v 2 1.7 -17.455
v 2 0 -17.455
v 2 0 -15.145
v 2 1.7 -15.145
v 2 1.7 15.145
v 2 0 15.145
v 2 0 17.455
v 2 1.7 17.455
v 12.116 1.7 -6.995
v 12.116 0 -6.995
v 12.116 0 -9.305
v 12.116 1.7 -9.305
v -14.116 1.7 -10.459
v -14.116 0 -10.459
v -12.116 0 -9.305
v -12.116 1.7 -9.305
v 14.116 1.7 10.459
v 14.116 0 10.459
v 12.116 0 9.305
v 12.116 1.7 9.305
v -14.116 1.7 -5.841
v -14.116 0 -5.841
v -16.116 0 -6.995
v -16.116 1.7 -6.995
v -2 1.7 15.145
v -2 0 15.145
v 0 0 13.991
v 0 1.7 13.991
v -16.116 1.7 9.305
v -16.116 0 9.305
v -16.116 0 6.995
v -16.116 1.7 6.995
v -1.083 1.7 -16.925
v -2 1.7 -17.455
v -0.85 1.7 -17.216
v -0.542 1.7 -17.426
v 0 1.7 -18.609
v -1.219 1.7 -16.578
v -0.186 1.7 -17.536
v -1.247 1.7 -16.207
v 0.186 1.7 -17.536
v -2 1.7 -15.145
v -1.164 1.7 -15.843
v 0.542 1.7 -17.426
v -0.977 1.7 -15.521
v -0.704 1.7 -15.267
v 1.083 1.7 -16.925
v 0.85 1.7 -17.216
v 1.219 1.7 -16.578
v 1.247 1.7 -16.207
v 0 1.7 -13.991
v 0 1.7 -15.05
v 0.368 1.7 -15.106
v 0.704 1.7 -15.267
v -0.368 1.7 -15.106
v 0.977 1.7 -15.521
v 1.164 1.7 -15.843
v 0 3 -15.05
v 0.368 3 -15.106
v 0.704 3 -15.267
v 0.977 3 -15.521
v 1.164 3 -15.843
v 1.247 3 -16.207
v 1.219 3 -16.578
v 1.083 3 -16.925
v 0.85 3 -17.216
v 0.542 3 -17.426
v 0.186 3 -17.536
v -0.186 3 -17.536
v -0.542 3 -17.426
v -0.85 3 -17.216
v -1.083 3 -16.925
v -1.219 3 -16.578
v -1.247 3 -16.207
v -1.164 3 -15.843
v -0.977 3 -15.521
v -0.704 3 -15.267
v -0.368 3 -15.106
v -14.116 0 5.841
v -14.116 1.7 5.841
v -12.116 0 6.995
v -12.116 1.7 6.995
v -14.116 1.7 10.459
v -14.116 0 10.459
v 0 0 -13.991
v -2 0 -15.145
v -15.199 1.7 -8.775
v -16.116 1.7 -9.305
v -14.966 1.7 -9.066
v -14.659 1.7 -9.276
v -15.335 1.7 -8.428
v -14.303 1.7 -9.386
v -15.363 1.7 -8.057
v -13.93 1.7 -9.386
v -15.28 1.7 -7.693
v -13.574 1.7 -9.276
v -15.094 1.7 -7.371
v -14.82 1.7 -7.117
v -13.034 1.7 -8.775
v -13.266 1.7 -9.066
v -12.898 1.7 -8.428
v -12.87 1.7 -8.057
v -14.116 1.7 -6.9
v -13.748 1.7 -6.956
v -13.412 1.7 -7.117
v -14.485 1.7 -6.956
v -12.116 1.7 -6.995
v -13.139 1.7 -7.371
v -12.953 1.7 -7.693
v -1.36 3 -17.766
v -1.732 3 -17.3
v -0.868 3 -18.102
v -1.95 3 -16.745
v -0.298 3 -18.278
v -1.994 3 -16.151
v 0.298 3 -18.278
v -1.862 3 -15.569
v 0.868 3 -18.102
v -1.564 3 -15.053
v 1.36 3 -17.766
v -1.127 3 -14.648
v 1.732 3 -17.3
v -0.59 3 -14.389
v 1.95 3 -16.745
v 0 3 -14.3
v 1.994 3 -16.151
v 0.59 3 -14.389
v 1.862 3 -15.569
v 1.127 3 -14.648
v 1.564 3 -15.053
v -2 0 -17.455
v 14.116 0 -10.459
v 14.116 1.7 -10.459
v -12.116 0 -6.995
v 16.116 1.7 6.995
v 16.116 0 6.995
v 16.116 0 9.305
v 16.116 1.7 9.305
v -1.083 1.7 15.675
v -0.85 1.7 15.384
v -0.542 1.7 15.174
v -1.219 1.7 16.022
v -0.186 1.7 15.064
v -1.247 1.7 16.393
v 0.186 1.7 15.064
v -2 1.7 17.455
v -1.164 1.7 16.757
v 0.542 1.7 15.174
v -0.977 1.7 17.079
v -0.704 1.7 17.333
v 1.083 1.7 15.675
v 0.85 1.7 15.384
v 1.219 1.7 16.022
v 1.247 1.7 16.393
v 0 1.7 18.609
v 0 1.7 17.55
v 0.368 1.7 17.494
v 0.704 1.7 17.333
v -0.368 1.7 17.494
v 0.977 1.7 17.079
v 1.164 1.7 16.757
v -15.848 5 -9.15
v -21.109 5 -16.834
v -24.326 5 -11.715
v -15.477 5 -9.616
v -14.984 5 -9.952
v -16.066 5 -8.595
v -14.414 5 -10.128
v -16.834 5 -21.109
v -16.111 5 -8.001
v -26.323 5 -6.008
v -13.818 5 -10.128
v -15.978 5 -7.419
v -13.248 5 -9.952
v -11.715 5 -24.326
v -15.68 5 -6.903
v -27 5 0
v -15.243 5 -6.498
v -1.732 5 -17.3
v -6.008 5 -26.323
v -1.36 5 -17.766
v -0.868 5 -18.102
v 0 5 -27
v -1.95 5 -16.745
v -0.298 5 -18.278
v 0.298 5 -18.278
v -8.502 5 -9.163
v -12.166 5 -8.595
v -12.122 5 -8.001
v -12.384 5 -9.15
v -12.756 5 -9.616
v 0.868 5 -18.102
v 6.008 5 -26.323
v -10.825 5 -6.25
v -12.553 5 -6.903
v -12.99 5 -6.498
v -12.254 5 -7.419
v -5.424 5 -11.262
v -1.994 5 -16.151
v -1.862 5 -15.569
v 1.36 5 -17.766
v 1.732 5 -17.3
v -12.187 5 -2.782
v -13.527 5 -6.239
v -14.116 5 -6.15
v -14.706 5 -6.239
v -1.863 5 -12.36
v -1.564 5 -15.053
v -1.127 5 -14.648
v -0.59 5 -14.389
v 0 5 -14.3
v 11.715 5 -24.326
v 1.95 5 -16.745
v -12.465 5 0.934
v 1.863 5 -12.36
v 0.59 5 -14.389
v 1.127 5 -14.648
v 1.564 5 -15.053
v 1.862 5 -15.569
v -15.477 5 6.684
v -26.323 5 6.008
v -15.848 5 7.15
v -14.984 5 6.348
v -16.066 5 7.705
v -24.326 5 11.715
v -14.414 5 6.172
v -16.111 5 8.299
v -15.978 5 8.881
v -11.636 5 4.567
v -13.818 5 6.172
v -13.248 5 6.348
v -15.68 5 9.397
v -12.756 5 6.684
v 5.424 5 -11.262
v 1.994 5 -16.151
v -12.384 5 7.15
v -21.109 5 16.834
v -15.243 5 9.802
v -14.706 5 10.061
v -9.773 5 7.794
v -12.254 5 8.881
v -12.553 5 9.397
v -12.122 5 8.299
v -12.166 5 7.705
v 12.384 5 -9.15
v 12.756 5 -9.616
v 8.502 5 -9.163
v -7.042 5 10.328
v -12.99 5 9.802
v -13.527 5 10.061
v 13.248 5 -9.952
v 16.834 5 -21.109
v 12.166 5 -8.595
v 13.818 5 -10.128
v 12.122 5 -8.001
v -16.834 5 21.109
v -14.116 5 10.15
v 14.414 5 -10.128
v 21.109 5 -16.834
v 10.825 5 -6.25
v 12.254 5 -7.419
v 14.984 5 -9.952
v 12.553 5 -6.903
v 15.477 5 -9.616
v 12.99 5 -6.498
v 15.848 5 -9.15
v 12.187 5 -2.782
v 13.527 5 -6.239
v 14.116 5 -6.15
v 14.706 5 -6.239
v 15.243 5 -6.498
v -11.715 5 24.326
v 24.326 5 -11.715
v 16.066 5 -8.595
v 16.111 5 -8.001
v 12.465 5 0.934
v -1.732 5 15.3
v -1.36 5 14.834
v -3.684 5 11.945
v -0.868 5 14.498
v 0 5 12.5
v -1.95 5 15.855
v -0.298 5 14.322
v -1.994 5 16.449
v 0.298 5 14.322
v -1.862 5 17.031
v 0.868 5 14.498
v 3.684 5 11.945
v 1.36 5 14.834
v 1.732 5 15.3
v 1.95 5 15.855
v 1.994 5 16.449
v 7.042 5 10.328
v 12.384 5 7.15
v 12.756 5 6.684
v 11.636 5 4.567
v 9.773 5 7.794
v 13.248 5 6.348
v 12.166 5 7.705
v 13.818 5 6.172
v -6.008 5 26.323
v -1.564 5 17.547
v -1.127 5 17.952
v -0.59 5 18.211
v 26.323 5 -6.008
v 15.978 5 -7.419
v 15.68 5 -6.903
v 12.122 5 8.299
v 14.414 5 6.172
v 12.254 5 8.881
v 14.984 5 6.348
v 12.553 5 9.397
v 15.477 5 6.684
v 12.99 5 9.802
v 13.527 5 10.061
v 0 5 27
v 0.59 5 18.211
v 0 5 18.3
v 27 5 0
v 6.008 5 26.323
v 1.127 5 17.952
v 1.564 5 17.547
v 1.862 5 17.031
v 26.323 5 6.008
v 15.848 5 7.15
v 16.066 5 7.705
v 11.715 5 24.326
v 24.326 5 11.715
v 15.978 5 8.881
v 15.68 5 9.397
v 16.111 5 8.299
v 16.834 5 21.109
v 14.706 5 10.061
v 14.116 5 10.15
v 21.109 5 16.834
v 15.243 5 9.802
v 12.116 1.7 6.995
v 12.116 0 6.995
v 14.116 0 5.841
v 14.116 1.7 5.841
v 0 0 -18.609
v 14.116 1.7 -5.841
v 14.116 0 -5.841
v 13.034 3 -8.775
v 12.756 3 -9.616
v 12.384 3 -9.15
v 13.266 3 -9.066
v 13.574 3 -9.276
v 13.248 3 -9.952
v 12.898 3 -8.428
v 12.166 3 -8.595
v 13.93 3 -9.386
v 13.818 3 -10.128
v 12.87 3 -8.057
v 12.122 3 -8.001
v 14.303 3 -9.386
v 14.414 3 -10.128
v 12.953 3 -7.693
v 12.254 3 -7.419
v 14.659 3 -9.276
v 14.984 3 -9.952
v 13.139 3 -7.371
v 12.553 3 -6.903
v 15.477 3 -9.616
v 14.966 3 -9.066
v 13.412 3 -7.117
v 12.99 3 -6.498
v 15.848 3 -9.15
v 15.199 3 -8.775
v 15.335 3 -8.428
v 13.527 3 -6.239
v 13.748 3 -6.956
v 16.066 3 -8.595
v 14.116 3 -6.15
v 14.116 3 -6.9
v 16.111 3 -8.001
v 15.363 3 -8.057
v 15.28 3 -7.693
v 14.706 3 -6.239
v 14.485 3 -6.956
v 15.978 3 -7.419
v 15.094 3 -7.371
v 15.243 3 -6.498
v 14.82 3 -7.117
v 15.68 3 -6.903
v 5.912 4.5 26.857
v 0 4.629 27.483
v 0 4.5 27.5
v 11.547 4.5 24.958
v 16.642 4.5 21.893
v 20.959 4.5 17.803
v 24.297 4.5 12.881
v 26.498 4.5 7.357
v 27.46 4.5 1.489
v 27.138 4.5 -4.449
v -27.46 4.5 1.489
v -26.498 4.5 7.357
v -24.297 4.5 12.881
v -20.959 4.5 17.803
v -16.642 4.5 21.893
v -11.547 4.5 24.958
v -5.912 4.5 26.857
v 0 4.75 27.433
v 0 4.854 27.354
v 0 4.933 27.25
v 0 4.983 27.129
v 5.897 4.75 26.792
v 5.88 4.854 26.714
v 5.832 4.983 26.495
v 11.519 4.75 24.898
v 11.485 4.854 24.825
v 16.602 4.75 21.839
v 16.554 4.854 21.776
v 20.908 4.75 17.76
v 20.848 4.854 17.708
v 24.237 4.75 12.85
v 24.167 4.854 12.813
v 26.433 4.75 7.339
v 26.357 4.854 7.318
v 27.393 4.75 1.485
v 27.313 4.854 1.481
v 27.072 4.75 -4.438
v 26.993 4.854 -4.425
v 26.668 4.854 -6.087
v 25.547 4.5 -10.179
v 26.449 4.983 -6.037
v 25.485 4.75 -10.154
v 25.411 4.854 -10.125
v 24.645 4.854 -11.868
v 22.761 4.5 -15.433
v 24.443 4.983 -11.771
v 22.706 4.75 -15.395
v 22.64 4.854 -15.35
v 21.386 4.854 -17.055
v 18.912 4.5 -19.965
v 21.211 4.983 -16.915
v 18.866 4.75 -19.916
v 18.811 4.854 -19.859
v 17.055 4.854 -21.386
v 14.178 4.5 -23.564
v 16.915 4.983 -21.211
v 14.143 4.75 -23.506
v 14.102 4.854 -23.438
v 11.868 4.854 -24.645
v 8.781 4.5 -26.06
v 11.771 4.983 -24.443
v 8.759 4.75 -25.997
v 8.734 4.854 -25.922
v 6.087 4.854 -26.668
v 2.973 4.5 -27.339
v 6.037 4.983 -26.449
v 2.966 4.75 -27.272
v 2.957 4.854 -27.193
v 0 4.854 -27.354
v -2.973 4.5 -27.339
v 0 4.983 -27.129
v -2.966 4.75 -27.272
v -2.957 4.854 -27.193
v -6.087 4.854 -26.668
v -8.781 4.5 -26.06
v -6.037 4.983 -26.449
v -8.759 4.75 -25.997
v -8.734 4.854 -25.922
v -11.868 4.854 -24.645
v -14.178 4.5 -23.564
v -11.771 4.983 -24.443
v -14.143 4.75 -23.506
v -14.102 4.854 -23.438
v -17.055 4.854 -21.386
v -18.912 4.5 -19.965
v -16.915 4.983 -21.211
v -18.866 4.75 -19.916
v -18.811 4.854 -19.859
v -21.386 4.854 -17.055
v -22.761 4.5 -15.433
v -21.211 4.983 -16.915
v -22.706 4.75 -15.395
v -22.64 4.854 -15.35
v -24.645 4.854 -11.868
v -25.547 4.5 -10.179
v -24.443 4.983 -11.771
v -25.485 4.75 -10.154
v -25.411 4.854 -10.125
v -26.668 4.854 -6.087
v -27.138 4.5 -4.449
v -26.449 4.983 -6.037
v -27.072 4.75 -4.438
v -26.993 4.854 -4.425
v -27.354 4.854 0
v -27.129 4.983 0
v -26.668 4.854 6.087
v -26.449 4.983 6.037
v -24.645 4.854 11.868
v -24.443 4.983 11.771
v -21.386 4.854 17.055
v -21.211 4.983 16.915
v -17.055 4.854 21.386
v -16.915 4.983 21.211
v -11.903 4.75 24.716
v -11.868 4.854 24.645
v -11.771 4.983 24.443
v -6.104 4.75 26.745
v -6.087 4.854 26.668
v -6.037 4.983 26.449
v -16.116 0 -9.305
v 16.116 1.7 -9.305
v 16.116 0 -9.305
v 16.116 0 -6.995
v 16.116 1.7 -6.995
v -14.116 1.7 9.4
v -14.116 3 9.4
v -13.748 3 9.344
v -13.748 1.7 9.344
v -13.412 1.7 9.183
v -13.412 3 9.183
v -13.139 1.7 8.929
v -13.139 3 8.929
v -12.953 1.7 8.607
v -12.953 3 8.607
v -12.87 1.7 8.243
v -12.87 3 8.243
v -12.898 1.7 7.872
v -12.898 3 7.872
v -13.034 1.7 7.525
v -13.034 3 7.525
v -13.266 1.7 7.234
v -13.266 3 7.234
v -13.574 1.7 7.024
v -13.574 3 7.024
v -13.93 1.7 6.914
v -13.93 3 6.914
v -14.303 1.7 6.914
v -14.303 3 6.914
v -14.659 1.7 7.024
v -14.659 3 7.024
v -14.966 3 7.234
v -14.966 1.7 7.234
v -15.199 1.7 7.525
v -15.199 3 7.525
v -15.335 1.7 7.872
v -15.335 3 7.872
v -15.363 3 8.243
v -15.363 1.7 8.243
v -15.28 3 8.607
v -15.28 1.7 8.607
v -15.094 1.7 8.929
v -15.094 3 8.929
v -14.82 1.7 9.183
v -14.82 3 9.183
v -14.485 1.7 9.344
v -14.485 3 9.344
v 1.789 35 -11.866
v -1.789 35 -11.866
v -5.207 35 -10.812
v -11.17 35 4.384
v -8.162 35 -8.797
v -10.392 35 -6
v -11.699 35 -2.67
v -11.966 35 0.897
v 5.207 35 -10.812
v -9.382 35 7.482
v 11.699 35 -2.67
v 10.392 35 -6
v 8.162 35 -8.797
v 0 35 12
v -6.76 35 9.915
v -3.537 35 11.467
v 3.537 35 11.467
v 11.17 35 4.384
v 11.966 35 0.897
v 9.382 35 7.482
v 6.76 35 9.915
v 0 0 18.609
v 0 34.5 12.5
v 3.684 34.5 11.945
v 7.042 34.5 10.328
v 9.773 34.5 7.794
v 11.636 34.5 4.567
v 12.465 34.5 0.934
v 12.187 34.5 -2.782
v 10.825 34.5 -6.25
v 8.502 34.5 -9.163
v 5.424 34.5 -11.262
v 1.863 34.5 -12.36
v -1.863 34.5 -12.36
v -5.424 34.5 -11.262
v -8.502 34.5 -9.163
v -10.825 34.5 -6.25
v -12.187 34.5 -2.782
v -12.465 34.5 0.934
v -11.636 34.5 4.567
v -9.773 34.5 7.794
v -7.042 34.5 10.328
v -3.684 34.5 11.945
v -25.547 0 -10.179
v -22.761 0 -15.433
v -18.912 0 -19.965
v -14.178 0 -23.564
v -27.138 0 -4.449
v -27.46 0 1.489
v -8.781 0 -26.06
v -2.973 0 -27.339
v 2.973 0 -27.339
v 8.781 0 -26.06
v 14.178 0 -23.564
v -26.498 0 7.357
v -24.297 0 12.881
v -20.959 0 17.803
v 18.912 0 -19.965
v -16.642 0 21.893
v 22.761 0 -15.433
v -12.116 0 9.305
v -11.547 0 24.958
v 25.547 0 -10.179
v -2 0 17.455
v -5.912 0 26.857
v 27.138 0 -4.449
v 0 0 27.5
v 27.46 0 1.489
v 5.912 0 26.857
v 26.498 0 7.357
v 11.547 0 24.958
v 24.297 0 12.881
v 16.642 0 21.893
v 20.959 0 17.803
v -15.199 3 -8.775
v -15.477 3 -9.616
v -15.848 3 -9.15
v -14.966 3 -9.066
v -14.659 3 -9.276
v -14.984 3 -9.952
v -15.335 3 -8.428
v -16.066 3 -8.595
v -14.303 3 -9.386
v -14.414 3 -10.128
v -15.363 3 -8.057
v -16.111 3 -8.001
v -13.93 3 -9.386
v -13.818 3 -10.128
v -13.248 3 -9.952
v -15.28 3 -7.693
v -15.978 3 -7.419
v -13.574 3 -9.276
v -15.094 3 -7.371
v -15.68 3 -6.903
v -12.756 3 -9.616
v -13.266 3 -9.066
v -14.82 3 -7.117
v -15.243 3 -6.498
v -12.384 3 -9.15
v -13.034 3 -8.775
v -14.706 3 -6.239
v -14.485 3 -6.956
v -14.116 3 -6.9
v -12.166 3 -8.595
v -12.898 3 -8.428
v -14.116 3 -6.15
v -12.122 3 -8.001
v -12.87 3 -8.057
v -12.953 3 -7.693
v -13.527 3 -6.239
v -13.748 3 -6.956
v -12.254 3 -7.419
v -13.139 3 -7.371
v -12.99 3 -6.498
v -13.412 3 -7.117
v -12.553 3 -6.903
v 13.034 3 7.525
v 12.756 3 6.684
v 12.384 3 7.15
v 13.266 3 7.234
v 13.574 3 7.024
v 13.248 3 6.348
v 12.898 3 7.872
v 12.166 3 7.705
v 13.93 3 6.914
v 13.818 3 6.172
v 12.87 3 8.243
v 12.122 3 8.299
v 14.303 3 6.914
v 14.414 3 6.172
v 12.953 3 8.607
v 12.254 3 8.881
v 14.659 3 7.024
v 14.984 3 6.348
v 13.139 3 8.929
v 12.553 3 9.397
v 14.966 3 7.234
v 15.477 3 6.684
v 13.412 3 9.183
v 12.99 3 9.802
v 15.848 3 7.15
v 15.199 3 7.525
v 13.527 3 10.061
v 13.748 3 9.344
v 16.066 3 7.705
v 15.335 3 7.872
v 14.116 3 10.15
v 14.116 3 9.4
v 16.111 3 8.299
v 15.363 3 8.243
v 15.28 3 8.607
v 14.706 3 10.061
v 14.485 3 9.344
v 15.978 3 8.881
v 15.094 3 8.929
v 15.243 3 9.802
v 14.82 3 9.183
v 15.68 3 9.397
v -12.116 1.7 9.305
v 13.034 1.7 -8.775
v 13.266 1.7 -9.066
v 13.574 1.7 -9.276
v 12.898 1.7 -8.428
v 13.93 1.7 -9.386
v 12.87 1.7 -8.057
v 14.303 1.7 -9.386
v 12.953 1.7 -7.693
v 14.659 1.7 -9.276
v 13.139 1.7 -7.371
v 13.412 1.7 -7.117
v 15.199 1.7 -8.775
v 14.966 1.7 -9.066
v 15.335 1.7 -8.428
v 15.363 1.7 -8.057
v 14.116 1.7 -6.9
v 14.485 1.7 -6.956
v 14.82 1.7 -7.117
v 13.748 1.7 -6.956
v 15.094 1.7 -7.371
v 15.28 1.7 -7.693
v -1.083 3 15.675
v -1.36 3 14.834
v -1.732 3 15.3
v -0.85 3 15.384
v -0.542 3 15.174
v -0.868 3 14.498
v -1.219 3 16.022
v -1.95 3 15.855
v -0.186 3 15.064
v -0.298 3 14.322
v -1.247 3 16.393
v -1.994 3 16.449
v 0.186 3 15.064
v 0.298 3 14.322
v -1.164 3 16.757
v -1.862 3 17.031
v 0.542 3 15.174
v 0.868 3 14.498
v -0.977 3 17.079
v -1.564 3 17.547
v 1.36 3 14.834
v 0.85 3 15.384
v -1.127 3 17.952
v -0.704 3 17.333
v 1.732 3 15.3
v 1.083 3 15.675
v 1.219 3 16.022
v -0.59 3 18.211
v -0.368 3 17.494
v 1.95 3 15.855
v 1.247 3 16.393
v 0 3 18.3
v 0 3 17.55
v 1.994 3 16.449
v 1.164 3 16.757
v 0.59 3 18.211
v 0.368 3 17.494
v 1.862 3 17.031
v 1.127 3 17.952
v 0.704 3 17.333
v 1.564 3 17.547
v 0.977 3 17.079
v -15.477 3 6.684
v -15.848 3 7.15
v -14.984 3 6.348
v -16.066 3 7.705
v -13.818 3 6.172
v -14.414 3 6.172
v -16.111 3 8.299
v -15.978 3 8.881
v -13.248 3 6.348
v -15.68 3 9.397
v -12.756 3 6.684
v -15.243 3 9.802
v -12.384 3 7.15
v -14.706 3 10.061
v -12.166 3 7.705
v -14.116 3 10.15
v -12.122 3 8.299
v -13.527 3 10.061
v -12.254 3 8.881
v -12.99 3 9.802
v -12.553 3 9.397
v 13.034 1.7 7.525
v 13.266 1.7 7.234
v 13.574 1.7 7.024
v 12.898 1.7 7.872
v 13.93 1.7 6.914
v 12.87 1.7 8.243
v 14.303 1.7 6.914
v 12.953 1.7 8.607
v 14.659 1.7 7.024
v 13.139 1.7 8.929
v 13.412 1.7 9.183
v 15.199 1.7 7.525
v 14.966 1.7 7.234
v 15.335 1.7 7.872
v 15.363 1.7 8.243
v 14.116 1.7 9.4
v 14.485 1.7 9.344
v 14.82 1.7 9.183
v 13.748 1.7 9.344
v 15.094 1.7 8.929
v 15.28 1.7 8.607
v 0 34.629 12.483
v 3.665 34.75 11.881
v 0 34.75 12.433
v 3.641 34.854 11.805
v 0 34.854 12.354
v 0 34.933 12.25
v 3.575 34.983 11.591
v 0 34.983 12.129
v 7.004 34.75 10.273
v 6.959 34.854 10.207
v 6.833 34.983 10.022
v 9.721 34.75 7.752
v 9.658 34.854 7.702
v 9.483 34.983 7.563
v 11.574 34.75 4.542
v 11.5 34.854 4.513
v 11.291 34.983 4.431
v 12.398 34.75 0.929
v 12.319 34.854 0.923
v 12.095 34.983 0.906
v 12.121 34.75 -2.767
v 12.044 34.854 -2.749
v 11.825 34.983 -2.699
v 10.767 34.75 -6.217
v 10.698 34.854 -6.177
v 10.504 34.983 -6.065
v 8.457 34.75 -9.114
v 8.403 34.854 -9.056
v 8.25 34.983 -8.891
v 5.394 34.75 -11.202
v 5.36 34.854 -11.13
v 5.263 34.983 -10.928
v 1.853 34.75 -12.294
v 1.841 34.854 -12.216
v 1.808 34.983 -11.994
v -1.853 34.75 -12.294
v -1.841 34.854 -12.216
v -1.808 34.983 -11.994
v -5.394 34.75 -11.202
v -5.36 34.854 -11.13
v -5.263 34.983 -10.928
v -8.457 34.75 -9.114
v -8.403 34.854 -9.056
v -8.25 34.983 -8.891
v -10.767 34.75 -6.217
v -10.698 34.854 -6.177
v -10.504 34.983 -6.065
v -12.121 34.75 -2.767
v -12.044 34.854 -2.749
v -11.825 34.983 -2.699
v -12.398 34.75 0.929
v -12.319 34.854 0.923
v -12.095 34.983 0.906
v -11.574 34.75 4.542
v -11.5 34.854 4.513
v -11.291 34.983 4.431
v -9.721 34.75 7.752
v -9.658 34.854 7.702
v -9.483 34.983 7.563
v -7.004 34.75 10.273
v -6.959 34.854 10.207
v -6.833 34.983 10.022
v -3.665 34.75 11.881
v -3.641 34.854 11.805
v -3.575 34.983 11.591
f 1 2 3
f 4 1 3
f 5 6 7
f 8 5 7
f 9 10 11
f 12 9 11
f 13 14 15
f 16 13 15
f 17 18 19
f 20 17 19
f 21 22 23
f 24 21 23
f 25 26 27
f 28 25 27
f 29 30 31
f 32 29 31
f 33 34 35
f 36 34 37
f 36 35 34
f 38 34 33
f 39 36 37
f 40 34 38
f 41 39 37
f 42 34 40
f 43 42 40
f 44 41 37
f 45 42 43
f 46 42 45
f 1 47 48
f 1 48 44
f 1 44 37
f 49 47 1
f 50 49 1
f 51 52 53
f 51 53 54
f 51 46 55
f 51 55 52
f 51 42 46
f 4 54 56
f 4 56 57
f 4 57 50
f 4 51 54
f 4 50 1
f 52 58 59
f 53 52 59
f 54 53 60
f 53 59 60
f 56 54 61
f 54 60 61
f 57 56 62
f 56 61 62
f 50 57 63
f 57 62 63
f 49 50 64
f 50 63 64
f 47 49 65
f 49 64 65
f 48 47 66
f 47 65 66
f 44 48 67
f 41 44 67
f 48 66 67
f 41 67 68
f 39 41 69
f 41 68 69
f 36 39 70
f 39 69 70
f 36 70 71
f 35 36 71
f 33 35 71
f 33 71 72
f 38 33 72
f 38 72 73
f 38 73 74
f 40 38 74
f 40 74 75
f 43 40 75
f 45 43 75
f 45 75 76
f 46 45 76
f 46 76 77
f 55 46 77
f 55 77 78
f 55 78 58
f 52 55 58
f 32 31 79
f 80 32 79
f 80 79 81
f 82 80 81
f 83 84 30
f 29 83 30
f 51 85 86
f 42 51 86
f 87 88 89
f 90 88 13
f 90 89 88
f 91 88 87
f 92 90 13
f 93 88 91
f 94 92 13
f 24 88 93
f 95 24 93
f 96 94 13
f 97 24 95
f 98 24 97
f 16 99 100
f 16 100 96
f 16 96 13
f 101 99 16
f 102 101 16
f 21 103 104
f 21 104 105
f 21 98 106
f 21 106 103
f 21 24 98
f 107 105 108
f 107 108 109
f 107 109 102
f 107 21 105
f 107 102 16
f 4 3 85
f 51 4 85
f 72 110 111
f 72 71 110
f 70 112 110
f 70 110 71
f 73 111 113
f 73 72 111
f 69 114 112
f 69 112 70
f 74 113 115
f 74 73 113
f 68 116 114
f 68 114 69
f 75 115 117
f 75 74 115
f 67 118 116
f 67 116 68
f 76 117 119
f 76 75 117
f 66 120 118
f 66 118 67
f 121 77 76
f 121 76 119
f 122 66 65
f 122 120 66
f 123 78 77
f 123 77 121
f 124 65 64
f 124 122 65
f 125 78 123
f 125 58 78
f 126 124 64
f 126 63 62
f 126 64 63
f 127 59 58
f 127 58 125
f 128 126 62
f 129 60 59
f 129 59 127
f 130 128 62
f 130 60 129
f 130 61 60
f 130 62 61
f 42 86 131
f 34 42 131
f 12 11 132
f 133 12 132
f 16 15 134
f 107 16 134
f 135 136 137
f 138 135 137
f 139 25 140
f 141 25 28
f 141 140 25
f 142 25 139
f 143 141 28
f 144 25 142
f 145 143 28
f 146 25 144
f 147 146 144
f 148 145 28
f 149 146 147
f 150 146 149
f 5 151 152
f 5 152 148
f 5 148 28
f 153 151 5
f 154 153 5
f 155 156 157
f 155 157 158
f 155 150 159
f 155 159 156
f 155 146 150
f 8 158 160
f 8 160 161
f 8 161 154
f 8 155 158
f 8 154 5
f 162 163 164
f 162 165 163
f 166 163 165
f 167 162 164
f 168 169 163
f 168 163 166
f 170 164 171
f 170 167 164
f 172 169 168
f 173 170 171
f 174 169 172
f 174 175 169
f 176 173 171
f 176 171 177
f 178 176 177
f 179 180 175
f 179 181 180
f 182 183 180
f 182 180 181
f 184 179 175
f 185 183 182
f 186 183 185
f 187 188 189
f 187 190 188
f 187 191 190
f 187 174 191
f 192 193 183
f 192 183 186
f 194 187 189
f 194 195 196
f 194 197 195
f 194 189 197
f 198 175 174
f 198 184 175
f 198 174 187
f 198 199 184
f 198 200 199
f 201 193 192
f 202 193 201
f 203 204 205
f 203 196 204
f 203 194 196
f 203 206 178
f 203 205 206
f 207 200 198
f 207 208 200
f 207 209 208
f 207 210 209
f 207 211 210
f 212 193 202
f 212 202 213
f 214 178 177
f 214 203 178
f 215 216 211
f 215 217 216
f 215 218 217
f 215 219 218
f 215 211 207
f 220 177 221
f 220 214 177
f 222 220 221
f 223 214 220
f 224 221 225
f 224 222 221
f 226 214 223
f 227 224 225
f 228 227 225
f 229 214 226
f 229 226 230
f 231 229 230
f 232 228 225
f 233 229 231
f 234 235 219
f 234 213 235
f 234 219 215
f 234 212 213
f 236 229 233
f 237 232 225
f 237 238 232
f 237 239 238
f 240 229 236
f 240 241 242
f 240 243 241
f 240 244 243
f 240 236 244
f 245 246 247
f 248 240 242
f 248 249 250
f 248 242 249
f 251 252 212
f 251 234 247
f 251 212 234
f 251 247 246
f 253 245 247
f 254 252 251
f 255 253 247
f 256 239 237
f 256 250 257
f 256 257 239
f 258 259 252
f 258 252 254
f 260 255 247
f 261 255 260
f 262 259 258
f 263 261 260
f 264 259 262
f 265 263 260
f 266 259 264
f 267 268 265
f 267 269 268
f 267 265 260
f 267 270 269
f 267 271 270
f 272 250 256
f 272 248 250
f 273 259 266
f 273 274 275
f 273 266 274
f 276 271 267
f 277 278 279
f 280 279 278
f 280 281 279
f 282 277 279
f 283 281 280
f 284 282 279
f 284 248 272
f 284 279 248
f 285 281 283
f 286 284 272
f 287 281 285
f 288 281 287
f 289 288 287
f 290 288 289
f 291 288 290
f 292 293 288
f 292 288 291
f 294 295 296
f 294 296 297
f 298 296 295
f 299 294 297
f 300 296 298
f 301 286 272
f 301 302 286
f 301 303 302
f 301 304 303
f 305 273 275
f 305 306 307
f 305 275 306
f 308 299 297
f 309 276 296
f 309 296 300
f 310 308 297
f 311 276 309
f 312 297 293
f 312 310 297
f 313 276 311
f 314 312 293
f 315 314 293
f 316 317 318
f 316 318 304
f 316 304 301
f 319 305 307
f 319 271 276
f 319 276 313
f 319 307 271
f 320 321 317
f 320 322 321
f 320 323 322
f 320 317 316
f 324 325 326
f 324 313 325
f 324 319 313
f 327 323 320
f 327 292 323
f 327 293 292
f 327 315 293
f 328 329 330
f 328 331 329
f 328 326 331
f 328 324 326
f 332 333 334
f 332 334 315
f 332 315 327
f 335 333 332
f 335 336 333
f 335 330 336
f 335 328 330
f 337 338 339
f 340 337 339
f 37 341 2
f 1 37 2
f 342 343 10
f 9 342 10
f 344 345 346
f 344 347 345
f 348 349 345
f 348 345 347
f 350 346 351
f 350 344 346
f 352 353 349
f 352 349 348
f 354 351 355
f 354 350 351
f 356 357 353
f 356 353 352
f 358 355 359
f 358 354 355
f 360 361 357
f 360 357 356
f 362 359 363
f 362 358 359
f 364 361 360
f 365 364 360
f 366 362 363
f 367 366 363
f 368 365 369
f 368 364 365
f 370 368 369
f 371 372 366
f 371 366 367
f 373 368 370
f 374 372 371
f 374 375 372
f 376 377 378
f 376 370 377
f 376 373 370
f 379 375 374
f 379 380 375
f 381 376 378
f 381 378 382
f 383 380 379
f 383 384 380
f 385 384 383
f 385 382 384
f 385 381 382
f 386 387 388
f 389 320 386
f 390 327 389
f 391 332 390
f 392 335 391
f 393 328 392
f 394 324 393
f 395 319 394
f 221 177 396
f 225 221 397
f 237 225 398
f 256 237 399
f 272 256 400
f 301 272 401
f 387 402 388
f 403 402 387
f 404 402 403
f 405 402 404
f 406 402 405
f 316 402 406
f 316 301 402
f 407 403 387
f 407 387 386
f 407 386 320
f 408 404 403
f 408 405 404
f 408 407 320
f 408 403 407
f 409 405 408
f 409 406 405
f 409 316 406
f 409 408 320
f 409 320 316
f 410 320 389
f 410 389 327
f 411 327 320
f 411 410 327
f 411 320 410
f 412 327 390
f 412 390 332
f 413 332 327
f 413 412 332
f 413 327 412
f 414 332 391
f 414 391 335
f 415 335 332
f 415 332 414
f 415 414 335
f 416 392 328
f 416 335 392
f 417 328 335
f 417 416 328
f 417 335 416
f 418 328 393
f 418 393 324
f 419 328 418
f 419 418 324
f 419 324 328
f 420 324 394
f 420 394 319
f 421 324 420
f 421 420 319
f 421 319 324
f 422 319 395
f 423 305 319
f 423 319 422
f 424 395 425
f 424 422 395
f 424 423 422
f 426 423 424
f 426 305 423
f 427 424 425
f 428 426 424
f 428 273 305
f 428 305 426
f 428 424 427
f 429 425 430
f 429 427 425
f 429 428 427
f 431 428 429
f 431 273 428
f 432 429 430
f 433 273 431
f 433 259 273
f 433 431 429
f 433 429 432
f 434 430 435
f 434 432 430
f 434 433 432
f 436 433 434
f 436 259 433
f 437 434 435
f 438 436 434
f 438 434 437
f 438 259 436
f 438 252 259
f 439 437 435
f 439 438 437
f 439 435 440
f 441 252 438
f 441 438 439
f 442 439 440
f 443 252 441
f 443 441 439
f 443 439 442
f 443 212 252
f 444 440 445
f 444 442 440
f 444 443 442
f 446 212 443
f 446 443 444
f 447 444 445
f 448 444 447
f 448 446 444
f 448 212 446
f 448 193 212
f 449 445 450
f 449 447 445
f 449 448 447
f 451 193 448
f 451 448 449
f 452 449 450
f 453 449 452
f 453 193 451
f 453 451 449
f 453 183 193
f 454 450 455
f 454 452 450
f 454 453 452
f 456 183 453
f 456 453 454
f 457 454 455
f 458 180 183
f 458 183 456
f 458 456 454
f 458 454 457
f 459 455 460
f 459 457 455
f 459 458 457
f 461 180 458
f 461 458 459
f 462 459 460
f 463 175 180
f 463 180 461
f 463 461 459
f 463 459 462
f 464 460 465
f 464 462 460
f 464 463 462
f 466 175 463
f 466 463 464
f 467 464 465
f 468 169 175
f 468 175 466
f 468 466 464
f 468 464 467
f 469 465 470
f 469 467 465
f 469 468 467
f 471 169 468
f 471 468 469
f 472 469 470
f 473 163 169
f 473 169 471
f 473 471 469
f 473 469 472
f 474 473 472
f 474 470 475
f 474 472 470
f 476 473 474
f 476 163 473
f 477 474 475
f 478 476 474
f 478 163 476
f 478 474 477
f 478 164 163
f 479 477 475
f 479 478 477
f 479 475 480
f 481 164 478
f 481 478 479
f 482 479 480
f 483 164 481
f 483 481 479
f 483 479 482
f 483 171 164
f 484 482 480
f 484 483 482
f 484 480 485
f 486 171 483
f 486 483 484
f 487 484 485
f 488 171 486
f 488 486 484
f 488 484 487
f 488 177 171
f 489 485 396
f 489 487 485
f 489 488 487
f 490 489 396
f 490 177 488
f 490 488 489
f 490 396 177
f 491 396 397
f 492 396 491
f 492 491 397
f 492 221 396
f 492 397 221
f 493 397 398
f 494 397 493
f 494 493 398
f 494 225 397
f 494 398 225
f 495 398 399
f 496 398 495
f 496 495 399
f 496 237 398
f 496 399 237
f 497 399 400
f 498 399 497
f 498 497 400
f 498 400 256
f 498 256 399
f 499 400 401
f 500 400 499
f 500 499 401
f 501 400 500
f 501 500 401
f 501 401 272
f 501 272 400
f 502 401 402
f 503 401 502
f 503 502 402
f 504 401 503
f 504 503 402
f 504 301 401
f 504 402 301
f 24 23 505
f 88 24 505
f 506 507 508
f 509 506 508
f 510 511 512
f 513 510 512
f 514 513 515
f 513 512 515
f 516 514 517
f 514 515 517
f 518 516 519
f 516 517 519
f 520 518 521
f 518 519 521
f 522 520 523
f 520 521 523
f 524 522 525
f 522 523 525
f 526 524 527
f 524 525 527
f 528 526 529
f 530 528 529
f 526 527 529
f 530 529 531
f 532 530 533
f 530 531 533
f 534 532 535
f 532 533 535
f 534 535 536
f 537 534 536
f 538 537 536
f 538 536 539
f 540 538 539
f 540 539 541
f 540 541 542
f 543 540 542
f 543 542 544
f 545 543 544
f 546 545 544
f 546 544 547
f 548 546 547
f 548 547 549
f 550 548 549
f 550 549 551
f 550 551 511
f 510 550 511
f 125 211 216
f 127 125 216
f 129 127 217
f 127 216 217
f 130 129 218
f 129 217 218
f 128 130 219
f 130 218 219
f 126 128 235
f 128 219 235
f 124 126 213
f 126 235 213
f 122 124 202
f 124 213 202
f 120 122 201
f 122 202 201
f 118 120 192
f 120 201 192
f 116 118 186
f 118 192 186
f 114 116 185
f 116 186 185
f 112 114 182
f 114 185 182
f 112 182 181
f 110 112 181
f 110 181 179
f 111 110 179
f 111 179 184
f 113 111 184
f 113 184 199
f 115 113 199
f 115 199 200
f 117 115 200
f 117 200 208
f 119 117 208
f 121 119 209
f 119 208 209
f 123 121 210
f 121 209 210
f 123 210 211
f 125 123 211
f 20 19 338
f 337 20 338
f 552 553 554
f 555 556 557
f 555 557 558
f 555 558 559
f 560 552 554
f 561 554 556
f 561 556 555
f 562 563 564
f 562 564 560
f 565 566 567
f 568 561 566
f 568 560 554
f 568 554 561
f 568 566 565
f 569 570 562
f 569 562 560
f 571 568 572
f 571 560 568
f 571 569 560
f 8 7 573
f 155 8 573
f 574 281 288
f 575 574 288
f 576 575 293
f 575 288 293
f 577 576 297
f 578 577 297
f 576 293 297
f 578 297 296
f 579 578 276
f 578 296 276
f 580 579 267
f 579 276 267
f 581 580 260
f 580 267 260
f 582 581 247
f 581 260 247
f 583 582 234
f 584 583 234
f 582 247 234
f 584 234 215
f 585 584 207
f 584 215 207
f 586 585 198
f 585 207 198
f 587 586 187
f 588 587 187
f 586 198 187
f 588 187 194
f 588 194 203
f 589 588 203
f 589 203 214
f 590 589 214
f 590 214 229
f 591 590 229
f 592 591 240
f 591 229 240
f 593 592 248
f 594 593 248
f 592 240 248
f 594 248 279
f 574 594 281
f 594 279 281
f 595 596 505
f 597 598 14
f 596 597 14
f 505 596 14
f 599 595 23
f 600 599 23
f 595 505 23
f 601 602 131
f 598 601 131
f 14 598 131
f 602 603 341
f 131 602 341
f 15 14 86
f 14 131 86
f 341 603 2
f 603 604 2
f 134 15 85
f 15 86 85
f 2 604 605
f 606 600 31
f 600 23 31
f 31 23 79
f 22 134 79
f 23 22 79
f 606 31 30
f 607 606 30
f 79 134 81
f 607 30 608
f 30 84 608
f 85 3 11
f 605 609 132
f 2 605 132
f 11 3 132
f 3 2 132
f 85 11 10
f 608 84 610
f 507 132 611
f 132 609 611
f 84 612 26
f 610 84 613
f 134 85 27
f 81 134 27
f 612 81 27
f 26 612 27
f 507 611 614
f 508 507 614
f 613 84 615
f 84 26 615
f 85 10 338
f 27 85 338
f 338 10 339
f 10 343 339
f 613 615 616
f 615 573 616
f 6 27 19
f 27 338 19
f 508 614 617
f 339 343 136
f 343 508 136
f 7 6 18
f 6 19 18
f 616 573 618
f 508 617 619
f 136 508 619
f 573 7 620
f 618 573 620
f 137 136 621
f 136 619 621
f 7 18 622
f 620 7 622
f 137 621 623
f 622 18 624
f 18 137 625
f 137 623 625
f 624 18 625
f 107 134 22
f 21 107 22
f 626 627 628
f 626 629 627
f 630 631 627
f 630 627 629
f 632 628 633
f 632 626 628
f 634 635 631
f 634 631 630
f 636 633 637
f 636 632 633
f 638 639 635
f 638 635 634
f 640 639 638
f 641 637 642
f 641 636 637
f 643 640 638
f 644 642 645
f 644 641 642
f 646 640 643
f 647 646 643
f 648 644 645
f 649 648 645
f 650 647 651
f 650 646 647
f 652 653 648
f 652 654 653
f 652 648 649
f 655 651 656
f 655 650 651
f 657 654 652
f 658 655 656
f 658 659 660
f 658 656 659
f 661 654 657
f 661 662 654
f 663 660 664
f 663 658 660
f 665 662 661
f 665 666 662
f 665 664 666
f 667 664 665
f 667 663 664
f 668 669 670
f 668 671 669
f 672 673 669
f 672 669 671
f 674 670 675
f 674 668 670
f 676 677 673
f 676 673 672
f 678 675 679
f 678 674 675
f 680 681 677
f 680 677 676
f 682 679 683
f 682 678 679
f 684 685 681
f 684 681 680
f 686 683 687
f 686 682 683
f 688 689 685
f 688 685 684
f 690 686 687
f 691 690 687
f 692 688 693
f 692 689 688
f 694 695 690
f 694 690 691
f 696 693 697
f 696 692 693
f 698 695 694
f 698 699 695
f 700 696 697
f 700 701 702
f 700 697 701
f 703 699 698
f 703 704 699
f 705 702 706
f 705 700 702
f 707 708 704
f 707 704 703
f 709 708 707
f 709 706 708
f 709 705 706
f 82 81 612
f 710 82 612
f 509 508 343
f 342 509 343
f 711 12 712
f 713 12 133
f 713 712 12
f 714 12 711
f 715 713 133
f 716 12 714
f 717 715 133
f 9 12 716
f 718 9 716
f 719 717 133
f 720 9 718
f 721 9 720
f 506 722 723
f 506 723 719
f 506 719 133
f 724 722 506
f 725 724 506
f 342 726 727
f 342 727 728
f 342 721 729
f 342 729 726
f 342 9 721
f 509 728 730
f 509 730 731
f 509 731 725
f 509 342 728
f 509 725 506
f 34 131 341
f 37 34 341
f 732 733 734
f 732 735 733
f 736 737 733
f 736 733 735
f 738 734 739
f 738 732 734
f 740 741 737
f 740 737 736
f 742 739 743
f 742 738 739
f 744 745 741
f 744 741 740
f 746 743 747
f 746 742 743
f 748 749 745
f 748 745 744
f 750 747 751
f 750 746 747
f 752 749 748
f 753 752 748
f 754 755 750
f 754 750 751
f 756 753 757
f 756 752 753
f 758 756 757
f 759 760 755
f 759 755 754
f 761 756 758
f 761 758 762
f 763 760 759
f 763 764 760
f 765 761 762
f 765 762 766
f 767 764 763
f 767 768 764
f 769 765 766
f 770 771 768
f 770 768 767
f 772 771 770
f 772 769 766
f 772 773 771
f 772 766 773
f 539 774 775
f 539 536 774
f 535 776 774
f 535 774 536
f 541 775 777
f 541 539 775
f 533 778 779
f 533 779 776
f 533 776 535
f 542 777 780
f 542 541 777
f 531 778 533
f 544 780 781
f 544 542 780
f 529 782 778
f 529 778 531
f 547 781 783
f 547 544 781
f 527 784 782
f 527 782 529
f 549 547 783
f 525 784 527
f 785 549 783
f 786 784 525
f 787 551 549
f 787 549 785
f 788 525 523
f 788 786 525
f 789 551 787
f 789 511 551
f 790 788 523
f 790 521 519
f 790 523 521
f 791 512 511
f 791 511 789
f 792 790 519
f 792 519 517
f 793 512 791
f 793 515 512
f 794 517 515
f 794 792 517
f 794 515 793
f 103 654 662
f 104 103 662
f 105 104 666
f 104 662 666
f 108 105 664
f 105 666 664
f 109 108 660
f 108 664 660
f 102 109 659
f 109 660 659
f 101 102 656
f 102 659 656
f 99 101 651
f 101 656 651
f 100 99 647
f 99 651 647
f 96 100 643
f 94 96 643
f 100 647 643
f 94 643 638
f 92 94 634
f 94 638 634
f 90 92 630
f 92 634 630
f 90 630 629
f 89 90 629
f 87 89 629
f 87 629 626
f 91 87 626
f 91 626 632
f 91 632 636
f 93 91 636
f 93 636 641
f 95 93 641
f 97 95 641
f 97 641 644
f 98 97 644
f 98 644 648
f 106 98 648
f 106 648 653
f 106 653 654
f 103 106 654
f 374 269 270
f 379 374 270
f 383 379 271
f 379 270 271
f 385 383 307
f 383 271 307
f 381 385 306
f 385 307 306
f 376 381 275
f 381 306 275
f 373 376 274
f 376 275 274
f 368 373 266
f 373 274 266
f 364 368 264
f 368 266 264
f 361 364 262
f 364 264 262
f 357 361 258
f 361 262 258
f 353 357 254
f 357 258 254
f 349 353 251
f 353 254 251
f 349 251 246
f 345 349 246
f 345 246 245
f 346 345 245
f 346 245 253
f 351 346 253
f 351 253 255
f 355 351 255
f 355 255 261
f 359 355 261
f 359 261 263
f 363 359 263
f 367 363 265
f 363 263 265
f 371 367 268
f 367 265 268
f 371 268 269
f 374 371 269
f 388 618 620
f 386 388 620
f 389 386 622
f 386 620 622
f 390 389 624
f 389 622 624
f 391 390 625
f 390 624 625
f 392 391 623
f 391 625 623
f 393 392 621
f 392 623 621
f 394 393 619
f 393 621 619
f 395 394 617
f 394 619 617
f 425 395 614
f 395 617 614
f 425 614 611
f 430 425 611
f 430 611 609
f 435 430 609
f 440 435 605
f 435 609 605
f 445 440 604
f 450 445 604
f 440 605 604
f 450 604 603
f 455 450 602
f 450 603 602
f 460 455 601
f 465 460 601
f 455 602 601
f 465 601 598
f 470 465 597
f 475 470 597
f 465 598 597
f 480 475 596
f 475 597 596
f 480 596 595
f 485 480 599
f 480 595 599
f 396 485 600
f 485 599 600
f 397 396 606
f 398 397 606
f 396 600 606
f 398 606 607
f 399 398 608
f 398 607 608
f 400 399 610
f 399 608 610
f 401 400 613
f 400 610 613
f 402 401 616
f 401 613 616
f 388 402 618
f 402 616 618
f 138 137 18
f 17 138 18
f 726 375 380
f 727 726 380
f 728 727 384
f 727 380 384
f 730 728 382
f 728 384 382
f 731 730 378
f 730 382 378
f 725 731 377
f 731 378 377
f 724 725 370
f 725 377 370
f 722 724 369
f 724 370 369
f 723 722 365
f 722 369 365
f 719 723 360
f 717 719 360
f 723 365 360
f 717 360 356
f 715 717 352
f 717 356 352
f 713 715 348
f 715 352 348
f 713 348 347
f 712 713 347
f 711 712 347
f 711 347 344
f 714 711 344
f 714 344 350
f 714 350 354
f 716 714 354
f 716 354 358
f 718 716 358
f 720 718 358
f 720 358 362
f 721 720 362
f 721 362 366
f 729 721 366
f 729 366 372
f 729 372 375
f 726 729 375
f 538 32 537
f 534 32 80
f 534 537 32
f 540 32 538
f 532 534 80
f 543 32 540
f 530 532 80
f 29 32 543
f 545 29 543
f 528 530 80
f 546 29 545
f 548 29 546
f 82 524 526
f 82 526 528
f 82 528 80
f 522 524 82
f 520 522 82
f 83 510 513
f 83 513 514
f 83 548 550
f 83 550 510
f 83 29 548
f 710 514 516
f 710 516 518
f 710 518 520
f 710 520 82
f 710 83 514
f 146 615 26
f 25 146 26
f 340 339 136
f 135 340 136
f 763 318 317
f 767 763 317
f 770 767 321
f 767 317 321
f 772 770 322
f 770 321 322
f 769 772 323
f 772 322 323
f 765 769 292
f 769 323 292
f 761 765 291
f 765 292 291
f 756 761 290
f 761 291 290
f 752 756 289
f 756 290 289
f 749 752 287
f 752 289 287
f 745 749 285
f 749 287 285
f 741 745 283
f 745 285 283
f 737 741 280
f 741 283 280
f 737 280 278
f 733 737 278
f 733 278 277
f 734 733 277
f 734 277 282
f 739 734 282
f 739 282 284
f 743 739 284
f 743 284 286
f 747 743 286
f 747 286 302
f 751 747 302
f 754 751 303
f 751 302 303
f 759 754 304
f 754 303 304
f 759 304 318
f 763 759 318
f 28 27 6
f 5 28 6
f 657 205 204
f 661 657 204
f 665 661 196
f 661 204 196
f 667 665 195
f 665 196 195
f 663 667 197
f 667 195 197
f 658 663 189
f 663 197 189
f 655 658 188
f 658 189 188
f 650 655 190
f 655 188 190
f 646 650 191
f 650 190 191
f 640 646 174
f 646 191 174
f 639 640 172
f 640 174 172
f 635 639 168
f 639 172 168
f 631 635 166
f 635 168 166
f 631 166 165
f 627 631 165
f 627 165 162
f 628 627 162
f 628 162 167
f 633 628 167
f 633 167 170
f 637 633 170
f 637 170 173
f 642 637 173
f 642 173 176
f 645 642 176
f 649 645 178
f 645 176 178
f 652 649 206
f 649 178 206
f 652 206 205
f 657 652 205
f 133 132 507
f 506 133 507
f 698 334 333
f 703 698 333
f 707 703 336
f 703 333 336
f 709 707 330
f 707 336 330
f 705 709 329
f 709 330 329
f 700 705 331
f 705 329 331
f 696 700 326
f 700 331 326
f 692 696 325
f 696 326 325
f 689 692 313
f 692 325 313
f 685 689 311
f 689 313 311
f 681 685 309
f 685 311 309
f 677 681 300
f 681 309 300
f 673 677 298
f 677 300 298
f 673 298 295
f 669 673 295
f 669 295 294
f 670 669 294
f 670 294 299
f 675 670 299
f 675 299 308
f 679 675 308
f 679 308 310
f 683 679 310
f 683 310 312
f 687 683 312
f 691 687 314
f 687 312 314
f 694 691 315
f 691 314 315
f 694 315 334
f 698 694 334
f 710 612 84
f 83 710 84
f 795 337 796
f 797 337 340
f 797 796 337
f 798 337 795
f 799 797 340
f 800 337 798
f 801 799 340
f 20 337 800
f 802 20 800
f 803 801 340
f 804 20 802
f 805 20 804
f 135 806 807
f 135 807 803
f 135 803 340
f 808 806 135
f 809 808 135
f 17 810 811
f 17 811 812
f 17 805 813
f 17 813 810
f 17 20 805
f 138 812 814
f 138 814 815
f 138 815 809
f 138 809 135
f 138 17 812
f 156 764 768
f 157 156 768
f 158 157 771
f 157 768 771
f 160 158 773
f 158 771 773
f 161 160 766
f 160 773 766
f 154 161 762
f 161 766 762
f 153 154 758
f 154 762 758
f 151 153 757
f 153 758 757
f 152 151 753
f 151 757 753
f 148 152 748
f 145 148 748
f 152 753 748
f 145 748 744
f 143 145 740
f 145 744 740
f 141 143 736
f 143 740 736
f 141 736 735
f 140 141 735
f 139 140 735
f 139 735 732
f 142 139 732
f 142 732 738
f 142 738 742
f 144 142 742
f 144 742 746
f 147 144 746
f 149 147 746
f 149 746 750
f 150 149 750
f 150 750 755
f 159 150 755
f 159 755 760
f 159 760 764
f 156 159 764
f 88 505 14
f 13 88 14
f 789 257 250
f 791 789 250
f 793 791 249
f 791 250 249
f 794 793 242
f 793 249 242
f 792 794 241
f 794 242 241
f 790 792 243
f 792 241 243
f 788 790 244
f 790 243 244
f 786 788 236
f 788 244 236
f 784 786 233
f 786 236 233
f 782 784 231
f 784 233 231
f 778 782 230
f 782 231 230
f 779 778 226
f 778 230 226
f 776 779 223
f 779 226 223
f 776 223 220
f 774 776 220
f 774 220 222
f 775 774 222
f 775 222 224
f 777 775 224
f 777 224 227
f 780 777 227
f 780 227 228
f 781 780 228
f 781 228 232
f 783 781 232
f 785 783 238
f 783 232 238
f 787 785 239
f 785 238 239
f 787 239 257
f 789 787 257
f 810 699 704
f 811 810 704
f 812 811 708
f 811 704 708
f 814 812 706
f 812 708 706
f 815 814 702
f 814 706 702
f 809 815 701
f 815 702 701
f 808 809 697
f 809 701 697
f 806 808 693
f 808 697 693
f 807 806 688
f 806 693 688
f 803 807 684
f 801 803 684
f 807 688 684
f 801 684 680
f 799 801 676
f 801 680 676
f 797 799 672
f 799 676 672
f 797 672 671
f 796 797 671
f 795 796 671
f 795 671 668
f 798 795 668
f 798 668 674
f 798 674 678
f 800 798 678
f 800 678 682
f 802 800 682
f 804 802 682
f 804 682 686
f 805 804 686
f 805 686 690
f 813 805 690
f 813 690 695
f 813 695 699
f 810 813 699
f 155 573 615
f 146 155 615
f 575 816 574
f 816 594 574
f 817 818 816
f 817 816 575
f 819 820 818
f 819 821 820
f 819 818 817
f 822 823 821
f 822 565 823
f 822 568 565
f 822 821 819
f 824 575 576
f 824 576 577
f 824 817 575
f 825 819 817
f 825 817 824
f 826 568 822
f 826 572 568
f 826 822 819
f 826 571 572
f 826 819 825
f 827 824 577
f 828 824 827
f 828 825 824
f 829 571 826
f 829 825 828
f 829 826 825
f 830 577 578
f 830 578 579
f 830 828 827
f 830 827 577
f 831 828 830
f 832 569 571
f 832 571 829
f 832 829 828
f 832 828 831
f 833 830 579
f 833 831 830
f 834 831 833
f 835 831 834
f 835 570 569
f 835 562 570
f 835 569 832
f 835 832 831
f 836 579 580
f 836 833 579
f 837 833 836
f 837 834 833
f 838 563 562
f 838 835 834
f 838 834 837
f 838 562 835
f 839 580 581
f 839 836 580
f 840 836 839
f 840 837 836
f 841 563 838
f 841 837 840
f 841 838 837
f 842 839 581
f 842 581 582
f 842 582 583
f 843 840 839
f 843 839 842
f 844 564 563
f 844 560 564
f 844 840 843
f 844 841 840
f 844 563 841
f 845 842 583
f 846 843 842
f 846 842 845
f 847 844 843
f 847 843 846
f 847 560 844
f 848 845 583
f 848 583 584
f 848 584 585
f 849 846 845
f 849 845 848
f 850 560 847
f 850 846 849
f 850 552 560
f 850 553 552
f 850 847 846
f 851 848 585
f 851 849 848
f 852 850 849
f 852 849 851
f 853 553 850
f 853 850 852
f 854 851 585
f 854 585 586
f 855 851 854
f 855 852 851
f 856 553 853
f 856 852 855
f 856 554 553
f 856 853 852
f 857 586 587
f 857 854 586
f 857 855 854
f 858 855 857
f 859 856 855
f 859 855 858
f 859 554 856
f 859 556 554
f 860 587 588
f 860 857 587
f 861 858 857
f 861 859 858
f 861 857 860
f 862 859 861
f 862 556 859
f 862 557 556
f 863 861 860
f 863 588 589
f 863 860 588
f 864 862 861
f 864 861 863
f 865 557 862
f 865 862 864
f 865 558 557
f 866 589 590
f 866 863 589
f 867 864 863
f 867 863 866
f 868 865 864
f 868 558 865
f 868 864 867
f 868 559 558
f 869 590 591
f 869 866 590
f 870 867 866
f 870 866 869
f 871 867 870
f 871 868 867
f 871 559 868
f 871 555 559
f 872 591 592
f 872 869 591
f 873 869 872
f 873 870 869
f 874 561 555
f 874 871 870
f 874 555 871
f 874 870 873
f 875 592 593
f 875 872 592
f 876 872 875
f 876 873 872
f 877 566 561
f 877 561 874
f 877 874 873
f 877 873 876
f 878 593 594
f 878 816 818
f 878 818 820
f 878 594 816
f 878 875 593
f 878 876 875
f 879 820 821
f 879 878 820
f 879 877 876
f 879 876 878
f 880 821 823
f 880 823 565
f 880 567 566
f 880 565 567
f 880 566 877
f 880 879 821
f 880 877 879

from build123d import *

# Parameters (mm, degrees)
SKETCH1_R           = 27.5
BOSS_EXTRUDE1_DEPTH = 5
SKETCH2_R           = 2
CUT_EXTRUDE1_DEPTH  = 2
SKETCH3_R           = 1.25
CUT_EXTRUDE2_DEPTH  = 40.210967853
CUT_EXTRUDE3_DEPTH  = 1.7
SKETCH5_R           = 12.5
BOSS_EXTRUDE2_DEPTH = 30
FILLET1_R           = 0.5


with BuildPart() as part:
    # Sketch1 → Boss-Extrude1 (new body)
    with BuildSketch(Plane(origin=(0, 0, 0), x_dir=(1, 0, 0), z_dir=(0, 1, 0))):
        with Locations(Location((0, 0, 0), (0, 0, 270))):
            Circle(SKETCH1_R)
    extrude(amount=BOSS_EXTRUDE1_DEPTH)

    # Sketch2 → Cut-Extrude1 (cut)
    with BuildSketch(Plane(origin=(0, 5, 0), x_dir=(1, 0, 0), z_dir=(0, 1, 0))):
        with Locations(Location((0, 16.3, 0), (0, 0, 270))):
            Circle(SKETCH2_R)
        with Locations(Location((14.116214082, 8.15, 0), (0, 0, 270))):
            Circle(SKETCH2_R)
        with Locations(Location((14.116214082, -8.15, 0), (0, 0, 270))):
            Circle(SKETCH2_R)
        with Locations(Location((0, -16.3, 0), (0, 0, 270))):
            Circle(SKETCH2_R)
        with Locations(Location((-14.116214082, -8.15, 0), (0, 0, 270))):
            Circle(SKETCH2_R)
        with Locations(Location((-14.116214082, 8.15, 0), (0, 0, 270))):
            Circle(SKETCH2_R)
    extrude(amount=-CUT_EXTRUDE1_DEPTH, mode=Mode.SUBTRACT)

    # Sketch3 → Cut-Extrude2 (cut, through all)
    with BuildSketch(Plane(origin=(0, 5, 0), x_dir=(1, 0, 0), z_dir=(0, 1, 0))):
        with Locations(Location((0, 16.3, 0), (0, 0, 270))):
            Circle(SKETCH3_R)
        with Locations(Location((14.116214082, 8.15, 0), (0, 0, 270))):
            Circle(SKETCH3_R)
        with Locations(Location((14.116214082, -8.15, 0), (0, 0, 270))):
            Circle(SKETCH3_R)
        with Locations(Location((0, -16.3, 0), (0, 0, 270))):
            Circle(SKETCH3_R)
        with Locations(Location((-14.116214082, -8.15, 0), (0, 0, 270))):
            Circle(SKETCH3_R)
        with Locations(Location((-14.116214082, 8.15, 0), (0, 0, 270))):
            Circle(SKETCH3_R)
    extrude(amount=-CUT_EXTRUDE2_DEPTH, mode=Mode.SUBTRACT)

    # Sketch4 → Cut-Extrude3 (cut)
    with BuildSketch(Plane.XZ):
        Polygon((12.116214082, 6.995299462), (14.116214082, 5.840598923), (16.116214082, 6.995299462), (16.116214082, 9.304700538), (14.116214082, 10.459401077), (12.116214082, 9.304700538), align=None)
        Polygon((0, 13.990598923), (2, 15.145299462), (2, 17.454700538), (0, 18.609401077), (-2, 17.454700538), (-2, 15.145299462), align=None)
        Polygon((12.116214082, -6.995299462), (12.116214082, -9.304700538), (14.116214082, -10.459401077), (16.116214082, -9.304700538), (16.116214082, -6.995299462), (14.116214082, -5.840598923), align=None)
        Polygon((0, -13.990598923), (-2, -15.145299462), (-2, -17.454700538), (0, -18.609401077), (2, -17.454700538), (2, -15.145299462), align=None)
        Polygon((-12.116214082, -6.995299462), (-14.116214082, -5.840598923), (-16.116214082, -6.995299462), (-16.116214082, -9.304700538), (-14.116214082, -10.459401077), (-12.116214082, -9.304700538), align=None)
        Polygon((-12.116214082, 6.995299462), (-12.116214082, 9.304700538), (-14.116214082, 10.459401077), (-16.116214082, 9.304700538), (-16.116214082, 6.995299462), (-14.116214082, 5.840598923), align=None)
    extrude(amount=-CUT_EXTRUDE3_DEPTH, mode=Mode.SUBTRACT)

    # Sketch5 → Boss-Extrude2 (add)
    with BuildSketch(Plane(origin=(0, 5, 0), x_dir=(1, 0, 0), z_dir=(0, 1, 0))):
        with Locations(Location((0, 0, 0), (0, 0, 270))):
            Circle(SKETCH5_R)
    extrude(amount=BOSS_EXTRUDE2_DEPTH)

    # Fillet1
    fillet1_edges = [part.edges().sort_by_distance(p)[0] for p in [
        (0, 35, -12.5),
        (0, 5, -27.5),
    ]]
    fillet(fillet1_edges, radius=FILLET1_R)


solid = part.part
